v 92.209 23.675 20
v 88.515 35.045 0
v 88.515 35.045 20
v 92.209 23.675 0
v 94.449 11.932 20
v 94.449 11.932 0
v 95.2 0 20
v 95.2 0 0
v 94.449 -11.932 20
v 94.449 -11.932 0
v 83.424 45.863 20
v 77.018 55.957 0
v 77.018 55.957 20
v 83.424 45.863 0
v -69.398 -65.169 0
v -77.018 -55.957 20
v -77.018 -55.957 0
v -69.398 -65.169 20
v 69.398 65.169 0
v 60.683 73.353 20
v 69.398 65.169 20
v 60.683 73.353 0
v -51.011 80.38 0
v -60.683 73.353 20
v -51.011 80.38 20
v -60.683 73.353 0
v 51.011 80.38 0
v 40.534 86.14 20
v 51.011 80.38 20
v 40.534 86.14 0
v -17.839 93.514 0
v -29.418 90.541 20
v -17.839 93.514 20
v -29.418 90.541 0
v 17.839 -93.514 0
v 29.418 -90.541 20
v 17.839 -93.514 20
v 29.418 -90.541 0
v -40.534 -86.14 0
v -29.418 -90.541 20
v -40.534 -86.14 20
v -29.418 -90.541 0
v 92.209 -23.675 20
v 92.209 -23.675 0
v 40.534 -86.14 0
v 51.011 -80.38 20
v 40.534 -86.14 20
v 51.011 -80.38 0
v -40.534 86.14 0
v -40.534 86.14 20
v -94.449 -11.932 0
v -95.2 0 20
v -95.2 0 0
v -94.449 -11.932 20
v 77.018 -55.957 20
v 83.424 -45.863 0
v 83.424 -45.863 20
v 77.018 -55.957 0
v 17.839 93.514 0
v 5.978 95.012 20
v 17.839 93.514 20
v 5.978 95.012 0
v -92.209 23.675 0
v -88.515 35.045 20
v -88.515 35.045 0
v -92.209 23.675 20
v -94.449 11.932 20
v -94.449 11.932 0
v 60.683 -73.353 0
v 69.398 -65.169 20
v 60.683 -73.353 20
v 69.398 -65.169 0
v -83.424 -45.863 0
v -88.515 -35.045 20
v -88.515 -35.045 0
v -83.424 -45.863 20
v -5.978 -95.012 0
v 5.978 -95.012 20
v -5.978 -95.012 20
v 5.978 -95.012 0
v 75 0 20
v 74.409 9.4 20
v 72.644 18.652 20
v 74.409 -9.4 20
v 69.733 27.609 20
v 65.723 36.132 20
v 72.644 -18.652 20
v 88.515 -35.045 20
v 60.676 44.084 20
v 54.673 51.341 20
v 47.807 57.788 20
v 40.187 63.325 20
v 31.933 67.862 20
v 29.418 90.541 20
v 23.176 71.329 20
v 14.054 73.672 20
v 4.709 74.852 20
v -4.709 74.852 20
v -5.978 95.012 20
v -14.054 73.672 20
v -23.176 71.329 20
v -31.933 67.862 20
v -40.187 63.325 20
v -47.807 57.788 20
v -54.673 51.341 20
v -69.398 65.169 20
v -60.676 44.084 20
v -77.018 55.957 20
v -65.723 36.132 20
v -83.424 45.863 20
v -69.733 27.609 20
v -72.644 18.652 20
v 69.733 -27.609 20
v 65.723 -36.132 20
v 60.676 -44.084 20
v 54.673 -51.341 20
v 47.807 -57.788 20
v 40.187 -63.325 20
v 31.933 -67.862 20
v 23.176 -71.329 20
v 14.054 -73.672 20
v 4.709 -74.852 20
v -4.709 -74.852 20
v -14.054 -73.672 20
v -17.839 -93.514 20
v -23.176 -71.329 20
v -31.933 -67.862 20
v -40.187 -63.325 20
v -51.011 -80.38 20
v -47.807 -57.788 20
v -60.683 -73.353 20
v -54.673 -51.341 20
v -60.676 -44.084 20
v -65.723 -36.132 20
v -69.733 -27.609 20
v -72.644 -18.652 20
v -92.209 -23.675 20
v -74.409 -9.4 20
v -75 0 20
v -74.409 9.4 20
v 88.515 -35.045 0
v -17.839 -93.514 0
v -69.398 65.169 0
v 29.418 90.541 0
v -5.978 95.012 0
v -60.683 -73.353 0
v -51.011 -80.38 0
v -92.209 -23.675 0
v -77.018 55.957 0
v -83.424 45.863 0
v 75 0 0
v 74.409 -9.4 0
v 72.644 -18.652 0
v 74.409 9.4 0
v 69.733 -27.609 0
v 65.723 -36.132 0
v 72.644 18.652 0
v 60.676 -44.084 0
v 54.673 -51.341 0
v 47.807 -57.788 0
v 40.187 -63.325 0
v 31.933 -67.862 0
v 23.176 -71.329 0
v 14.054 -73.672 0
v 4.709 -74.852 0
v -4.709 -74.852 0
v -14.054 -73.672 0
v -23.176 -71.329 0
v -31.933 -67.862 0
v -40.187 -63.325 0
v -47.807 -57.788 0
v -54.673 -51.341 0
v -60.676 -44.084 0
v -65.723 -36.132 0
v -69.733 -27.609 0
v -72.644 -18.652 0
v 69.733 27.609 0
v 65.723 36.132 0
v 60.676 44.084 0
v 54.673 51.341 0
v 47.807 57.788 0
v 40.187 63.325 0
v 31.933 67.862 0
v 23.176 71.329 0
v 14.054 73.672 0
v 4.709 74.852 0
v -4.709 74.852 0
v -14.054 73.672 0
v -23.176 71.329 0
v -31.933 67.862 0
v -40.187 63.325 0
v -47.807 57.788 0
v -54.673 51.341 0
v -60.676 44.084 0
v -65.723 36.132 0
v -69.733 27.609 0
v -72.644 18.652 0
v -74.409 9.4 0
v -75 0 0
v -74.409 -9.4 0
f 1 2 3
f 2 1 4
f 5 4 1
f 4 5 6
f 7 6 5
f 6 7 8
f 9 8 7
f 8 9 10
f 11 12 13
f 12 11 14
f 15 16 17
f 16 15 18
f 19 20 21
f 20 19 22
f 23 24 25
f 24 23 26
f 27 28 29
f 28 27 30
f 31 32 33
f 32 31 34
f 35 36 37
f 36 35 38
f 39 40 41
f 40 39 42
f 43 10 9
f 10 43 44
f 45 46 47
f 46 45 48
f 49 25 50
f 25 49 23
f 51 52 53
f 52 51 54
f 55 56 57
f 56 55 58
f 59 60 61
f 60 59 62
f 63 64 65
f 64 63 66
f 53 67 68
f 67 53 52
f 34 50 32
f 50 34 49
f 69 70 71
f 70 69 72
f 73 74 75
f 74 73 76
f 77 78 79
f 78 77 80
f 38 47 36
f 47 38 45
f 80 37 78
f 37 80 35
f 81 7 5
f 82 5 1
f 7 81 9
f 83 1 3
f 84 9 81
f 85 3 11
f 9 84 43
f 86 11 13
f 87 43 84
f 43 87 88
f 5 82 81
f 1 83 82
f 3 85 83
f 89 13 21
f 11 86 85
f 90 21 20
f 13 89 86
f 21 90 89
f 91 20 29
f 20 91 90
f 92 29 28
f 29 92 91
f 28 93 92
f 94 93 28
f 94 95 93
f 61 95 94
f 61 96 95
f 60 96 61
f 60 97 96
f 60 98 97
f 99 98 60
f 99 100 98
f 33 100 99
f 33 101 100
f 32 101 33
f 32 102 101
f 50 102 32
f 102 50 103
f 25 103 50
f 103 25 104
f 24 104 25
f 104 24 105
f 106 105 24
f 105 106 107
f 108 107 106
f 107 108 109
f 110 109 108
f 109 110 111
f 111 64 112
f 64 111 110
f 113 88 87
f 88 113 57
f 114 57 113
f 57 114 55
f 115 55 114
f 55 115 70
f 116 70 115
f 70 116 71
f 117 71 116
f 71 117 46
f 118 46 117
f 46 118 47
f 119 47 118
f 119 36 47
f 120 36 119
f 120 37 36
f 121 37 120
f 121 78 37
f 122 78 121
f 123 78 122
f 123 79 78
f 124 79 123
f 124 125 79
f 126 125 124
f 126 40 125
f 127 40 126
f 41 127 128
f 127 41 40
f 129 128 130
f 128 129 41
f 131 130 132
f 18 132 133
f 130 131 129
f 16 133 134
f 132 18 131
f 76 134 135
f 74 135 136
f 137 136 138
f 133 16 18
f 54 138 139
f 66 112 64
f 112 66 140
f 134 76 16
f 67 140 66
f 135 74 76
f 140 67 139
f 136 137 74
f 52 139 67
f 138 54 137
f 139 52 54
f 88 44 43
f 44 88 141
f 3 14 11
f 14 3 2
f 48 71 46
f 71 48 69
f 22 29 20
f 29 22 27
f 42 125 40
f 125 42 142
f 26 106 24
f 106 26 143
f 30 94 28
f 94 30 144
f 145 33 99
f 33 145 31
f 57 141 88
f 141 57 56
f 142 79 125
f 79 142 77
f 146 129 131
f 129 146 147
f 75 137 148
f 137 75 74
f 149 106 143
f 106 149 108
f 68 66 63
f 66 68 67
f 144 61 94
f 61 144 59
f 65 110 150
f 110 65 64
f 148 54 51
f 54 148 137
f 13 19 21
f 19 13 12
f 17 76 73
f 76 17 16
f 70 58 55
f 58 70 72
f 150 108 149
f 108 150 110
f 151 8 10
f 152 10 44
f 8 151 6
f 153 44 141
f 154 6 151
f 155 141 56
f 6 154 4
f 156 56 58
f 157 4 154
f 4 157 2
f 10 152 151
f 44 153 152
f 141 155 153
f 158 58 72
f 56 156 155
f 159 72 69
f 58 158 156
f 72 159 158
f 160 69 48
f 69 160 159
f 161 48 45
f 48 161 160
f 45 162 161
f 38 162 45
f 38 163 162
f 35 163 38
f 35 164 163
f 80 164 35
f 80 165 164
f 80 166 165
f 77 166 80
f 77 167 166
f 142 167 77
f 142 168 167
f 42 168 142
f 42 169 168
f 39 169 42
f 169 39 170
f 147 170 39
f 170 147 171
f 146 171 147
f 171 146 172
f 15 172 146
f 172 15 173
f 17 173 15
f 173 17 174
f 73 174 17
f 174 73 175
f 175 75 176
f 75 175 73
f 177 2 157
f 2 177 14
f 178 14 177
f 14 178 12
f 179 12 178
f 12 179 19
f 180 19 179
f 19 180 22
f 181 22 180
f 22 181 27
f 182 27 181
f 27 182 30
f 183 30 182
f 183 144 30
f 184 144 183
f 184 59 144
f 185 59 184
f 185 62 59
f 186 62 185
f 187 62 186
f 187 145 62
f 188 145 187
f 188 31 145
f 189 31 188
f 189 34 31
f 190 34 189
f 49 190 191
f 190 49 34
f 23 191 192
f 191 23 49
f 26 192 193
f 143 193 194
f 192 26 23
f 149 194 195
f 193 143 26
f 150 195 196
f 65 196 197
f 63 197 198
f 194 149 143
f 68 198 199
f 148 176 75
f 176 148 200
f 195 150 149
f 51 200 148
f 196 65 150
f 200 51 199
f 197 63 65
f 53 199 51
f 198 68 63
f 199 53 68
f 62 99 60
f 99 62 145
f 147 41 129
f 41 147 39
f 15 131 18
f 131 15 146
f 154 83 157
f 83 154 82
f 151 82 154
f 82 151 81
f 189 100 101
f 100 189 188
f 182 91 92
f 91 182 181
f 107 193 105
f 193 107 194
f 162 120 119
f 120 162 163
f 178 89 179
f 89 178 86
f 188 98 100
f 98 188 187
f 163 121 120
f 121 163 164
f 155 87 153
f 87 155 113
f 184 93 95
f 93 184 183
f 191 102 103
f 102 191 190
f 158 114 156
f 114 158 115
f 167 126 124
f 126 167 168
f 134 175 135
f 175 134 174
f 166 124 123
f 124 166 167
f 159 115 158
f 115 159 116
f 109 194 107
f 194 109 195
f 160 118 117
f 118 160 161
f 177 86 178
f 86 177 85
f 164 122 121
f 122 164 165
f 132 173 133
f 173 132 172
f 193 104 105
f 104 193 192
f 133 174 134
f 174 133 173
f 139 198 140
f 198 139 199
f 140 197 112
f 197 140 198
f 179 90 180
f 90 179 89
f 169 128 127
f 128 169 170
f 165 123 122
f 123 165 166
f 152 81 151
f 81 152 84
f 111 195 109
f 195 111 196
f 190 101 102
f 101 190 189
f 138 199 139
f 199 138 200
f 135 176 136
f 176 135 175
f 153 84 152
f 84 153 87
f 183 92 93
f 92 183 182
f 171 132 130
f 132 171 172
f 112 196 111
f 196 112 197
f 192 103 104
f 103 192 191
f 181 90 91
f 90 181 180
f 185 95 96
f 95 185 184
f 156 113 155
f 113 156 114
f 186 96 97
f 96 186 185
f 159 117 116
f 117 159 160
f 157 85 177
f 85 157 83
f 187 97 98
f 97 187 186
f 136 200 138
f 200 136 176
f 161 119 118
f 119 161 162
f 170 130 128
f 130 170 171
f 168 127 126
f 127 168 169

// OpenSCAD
$fn = 50;


difference() {
	union() {
		cylinder(h = 20, r = 95.2000000000);
	}
	union() {
		cylinder(h = 20, r = 75.0000000000);
	}
}
